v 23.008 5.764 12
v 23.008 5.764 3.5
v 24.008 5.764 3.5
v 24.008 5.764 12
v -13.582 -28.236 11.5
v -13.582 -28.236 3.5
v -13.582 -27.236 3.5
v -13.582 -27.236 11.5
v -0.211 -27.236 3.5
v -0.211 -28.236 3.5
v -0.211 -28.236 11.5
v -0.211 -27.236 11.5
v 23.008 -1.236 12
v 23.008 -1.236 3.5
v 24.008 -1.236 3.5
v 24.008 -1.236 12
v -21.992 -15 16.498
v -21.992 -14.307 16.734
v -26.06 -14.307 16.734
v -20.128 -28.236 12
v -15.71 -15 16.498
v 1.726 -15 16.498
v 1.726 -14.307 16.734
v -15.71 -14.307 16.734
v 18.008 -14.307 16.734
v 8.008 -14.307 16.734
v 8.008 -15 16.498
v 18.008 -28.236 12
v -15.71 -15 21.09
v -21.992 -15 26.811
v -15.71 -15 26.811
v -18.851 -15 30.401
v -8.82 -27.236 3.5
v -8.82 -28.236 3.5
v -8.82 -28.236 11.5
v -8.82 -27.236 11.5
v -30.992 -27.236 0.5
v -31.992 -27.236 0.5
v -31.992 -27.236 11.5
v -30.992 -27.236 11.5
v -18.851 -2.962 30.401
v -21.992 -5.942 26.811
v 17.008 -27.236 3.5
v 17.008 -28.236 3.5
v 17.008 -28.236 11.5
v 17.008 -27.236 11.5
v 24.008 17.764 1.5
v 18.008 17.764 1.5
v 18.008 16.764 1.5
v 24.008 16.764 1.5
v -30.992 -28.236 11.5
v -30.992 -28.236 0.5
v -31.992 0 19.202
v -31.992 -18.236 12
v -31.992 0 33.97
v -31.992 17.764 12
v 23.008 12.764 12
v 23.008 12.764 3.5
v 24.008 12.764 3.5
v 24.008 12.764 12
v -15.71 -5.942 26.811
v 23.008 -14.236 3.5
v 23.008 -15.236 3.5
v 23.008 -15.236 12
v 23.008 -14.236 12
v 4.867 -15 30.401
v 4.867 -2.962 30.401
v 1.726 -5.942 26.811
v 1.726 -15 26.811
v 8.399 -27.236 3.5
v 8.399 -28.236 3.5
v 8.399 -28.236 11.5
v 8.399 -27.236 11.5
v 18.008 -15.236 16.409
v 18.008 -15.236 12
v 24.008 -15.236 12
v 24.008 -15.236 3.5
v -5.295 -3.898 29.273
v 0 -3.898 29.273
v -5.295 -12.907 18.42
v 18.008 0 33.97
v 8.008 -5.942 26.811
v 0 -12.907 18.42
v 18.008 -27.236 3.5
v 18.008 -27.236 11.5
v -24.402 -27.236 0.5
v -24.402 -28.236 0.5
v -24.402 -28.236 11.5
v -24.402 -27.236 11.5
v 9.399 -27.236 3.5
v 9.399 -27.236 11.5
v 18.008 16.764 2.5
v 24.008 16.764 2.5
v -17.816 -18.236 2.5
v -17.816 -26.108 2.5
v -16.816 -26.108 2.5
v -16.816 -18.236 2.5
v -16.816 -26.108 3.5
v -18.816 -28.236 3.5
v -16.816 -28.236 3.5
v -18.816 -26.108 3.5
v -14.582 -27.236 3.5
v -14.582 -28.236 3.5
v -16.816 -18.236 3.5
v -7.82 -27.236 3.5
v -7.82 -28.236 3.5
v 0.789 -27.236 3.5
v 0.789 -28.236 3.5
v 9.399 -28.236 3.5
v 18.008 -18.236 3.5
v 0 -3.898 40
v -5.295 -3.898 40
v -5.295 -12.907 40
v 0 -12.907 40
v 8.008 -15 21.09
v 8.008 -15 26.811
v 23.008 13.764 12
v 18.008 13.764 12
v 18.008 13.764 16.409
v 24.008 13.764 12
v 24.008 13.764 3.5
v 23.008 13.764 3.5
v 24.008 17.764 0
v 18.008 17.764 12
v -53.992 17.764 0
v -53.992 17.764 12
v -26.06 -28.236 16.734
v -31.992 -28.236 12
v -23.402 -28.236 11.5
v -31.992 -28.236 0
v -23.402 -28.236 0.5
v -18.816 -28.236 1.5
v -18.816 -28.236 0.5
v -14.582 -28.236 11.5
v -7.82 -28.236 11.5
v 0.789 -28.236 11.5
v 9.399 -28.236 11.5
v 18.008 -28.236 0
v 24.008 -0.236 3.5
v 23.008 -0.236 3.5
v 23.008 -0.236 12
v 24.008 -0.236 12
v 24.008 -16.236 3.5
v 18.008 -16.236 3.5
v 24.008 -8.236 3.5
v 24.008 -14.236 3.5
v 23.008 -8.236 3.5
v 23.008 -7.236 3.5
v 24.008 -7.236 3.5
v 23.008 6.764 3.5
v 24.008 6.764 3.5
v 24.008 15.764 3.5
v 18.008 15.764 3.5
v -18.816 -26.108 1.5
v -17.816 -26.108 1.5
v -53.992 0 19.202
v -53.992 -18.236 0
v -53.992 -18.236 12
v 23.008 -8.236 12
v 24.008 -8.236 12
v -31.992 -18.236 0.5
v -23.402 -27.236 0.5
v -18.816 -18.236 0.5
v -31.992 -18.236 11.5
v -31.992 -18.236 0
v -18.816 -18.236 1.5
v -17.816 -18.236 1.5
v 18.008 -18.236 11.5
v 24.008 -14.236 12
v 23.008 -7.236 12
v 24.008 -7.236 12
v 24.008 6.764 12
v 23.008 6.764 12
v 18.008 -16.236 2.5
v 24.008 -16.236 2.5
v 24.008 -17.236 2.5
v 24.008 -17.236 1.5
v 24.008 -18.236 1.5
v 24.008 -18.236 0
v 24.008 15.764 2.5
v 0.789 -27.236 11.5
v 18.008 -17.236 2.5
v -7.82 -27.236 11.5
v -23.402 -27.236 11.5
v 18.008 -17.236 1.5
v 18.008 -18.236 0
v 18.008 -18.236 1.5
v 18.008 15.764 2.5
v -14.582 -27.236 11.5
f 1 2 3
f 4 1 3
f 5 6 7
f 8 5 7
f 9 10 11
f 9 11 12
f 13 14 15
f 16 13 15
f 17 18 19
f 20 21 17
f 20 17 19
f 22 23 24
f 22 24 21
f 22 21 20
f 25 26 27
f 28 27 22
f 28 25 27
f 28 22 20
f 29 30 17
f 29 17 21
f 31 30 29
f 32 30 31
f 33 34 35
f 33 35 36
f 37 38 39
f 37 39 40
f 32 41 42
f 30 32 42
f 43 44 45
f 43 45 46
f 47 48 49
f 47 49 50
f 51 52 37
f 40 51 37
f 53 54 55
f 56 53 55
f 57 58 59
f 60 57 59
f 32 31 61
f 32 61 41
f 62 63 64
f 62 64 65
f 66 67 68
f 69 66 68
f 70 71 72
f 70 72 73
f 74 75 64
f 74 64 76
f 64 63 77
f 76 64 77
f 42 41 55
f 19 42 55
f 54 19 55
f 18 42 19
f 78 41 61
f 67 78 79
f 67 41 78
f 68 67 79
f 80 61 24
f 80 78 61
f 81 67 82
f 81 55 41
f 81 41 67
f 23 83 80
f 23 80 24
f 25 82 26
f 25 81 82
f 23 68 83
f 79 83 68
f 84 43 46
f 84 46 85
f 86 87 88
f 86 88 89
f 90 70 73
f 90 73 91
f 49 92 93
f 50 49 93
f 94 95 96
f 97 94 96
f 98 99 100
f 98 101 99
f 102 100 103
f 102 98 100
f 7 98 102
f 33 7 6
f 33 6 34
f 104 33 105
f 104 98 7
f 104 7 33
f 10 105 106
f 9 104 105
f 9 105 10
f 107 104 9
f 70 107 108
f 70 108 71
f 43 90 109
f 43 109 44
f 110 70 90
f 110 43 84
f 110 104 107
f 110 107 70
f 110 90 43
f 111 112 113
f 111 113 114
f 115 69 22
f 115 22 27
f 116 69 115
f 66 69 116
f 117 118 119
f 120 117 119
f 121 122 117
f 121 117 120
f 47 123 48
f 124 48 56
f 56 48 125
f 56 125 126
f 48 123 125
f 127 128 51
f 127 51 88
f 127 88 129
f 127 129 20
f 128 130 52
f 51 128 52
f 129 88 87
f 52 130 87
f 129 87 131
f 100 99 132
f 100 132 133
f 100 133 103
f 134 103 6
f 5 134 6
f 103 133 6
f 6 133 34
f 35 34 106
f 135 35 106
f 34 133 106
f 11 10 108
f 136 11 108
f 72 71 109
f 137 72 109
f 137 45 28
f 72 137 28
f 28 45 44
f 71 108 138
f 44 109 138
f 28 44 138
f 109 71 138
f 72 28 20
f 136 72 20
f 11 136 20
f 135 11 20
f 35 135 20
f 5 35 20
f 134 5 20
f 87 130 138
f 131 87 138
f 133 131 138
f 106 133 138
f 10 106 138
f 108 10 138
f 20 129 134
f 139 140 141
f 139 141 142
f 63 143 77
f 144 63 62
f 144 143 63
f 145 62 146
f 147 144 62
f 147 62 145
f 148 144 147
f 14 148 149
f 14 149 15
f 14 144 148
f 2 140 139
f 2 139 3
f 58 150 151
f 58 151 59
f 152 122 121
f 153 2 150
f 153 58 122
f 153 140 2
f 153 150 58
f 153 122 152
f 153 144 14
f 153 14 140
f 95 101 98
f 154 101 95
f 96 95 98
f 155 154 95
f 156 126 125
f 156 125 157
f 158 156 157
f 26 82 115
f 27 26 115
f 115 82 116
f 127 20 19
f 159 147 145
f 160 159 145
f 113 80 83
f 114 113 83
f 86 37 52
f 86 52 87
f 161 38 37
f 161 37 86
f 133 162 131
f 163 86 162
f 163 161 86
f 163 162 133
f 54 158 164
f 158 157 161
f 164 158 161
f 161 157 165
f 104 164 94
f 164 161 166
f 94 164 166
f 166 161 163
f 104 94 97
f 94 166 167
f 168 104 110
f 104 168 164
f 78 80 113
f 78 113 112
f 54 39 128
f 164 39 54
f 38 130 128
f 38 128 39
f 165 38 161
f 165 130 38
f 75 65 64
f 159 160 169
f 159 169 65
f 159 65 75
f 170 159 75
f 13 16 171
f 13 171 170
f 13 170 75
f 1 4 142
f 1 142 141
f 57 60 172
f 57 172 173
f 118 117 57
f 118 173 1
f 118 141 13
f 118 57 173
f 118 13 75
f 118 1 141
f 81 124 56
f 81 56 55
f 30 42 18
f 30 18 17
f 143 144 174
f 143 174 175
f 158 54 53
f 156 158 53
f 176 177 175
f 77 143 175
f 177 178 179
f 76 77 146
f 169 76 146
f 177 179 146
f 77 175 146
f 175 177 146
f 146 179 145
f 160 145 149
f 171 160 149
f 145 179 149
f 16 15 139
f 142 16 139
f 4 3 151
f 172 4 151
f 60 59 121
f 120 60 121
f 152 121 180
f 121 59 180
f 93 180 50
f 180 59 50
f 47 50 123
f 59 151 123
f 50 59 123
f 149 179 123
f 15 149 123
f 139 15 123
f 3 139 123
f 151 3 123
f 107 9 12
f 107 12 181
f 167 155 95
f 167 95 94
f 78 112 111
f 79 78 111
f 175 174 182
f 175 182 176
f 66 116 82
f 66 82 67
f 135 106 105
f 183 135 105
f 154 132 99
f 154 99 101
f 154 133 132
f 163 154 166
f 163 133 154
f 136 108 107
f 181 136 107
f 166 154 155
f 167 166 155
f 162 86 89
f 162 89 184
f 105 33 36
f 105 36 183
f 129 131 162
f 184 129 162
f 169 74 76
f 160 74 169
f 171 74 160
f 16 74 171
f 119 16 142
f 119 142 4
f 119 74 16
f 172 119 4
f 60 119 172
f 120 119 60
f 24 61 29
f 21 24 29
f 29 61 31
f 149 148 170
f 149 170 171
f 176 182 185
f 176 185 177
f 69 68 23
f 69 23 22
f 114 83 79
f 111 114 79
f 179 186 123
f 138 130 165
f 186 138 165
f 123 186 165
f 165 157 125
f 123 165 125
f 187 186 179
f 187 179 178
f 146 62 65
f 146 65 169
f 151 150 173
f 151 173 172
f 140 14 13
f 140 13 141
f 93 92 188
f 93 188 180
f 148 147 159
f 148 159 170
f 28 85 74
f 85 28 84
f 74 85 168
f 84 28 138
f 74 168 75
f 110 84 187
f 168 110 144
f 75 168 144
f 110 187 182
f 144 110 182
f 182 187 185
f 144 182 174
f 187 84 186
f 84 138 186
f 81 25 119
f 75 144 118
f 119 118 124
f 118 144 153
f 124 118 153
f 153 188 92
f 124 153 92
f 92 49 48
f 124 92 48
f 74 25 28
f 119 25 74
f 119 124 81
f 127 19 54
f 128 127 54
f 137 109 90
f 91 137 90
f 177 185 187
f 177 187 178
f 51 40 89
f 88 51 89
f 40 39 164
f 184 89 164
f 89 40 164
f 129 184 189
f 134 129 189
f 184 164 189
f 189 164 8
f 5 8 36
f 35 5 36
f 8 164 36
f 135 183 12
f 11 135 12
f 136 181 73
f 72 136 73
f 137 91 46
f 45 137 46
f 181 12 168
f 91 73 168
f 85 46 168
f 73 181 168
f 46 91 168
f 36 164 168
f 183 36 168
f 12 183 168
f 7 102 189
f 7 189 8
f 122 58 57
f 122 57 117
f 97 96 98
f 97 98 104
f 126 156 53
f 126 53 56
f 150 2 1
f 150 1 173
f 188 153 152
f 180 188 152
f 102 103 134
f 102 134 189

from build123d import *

# Parameters (mm, degrees)
F0_W       = 72
F0_H       = 36
F1_DEPTH   = 12
F3_DEPTH   = 50
F5_DEPTH   = 22
F6_W       = 50
F6_H       = 0.5
F7_DEPTH   = 10
F8_DEPTH   = 10
F13_W      = 1
F13_H      = 10
F14_DEPTH  = 1
F15_DEPTH  = 2
F13_W_2    = 34.824172408
F16_DEPTH  = 3
F17_W      = 1
F17_H      = 1
F18_DEPTH  = 8
F19_DEPTH  = 8
F20_DEPTH  = 8
F21_DEPTH  = 8
F22_DEPTH  = 8
F13_H_2    = 1
F23_DEPTH  = 11
F24_DEPTH  = 11
F25_W      = 1
F25_H      = 2.1276606619
F27_DEPTH  = 2
F26_W      = 1
F26_H      = 2.1276606619
F28_DEPTH  = 1
F29_W      = 36
F29_H      = 3.5
F30_DEPTH  = 6
F31_W      = 6
F31_H      = 1
F32_DEPTH  = 2
F33_DEPTH  = 1
F34_DEPTH  = 2
F35_DEPTH  = 1
F37_START  = -4
F37_DEPTH  = 29
F38_W      = 1
F38_H      = 1
F39_DEPTH  = 8.5
F40_DEPTH  = 8.5
F41_DEPTH  = 8.5
F42_DEPTH  = 8.5
F43_DEPTH  = 8.5
F45_W      = 6.2820501626
F45_H      = 5.7211536914
F46_FACE_W = 6.2820501626
F46_FACE_H = 4.3090674287
F47_FACE_W = 6.2820501626
F47_FACE_H = 4.3090674287
F51_W      = 5.2950629033
F51_H      = 9.0086418204


with BuildPart() as f1:
    # F0 (on Top) → F1 (new body)
    with BuildSketch(Plane.XY):
        with Locations((-17.9916281849, -0.2358976454)):
            Rectangle(F0_W, F0_H)
    extrude(amount=F1_DEPTH)

    # F2 (on face) → F3 (join)
    with BuildSketch(Plane.YZ.offset(18.0083718151)):
        Polygon((-18.2358976454, 12), (17.7641023546, 12), (0, 33.9695699513), align=None)
    extrude(amount=-F3_DEPTH)

    # F4 (on face) → F5 (join, through all)
    with BuildSketch(Plane(origin=(-53.9916281849, 0, 0), x_dir=(0, -1, 0), z_dir=(-1, 0, 0))):
        Polygon((0, 19.2015562207), (-17.7641023546, 12), (18.2358976454, 12), align=None)
    extrude(amount=-F5_DEPTH)

    # F6 (on face) → F7 (join)
    with BuildSketch(Plane.XZ.offset(18.2358976454)):
        with Locations((-6.9916281849, 11.75)):
            Rectangle(F6_W, F6_H)
    extrude(amount=F7_DEPTH)

    # F6 (on face) → F8 (join)
    with BuildSketch(Plane.XZ.offset(18.2358976454)):
        with Locations((-6.9916281849, 0.25)):
            Rectangle(F6_W, F6_H)
    extrude(amount=F8_DEPTH)

    # F9 (on face) → F10 (join, up to the next surface of F1)
    with BuildSketch(Plane.XZ.offset(28.2358976454)):
        Polygon((-26.0598938912, 16.733692959), (-31.9916281849, 12), (-20.1281595975, 12), align=None)
    extrude(until=Until.NEXT, dir=(0, 1, 0))

    # F11 (on face) → F12 (join, up to the next surface of F1)
    with BuildSketch(Plane.YZ.offset(18.0083718151)):
        Polygon((-14.3066837157, 16.733692959), (-28.2358976454, 12), (-18.2358976454, 12), align=None)
    extrude(until=Until.NEXT, dir=(-1, 0, 0))

    # F13 (on face) → F14 (join)
    with BuildSketch(Plane.XY.offset(0.5)):
        with Locations((-18.3158005929, -23.2358976454)):
            Rectangle(F13_W, F13_H)
    extrude(amount=F14_DEPTH)

    # F13 (on face) → F15 (join)
    with BuildSketch(Plane.XY.offset(0.5)):
        with Locations((-17.3158005929, -23.2358976454)):
            Rectangle(F13_W, F13_H)
    extrude(amount=F15_DEPTH)

    # F13 (on face) → F16 (join)
    with BuildSketch(Plane.XY.offset(0.5)):
        with Locations((0.5962856111, -23.2358976454)):
            Rectangle(F13_W_2, F13_H)
    extrude(amount=F16_DEPTH)

    # F17 (on face) → F18 (join, through all)
    with BuildSketch(Plane.XY.offset(3.5)):
        with Locations((-14.0816532895, -27.7358976454)):
            Rectangle(F17_W, F17_H)
    extrude(amount=F18_DEPTH)

    # F17 (on face) → F19 (join, through all)
    with BuildSketch(Plane.XY.offset(3.5)):
        with Locations((-8.3204968274, -27.7358976454)):
            Rectangle(F17_W, F17_H)
    extrude(amount=F19_DEPTH)

    # F17 (on face) → F20 (join, through all)
    with BuildSketch(Plane.XY.offset(3.5)):
        with Locations((0.2891260535, -27.7358976454)):
            Rectangle(F17_W, F17_H)
    extrude(amount=F20_DEPTH)

    # F17 (on face) → F21 (join, through all)
    with BuildSketch(Plane.XY.offset(3.5)):
        with Locations((8.8987489343, -27.7358976454)):
            Rectangle(F17_W, F17_H)
    extrude(amount=F21_DEPTH)

    # F17 (on face) → F22 (join, through all)
    with BuildSketch(Plane.XY.offset(3.5)):
        with Locations((17.5083718151, -27.7358976454)):
            Rectangle(F17_W, F17_H)
    extrude(amount=F22_DEPTH)

    # F13 (on face) → F23 (join, through all)
    with BuildSketch(Plane.XY.offset(0.5)):
        with Locations((-31.4916281849, -27.7358976454)):
            Rectangle(F13_W, F13_H_2)
    extrude(amount=F23_DEPTH)

    # F13 (on face) → F24 (join, through all)
    with BuildSketch(Plane.XY.offset(0.5)):
        with Locations((-23.9017895311, -27.7358976454)):
            Rectangle(F13_W, F13_H_2)
    extrude(amount=F24_DEPTH)

    # F25 (on face) → F27 (join)
    with BuildSketch(Plane.XY.offset(1.5)):
        with Locations((-18.3158005929, -27.1720673144)):
            Rectangle(F25_W, F25_H)
    extrude(amount=F27_DEPTH)

    # F26 (on face) → F28 (join)
    with BuildSketch(Plane.XY.offset(2.5)):
        with Locations((-17.3158005929, -27.1720673144)):
            Rectangle(F26_W, F26_H)
    extrude(amount=F28_DEPTH)

    # F29 (on face) → F30 (join)
    with BuildSketch(Plane.YZ.offset(18.0083718151)):
        with Locations((-0.2358976454, 1.75)):
            Rectangle(F29_W, F29_H)
    extrude(amount=F30_DEPTH)

    # F31 (on face) → F32 (cut)
    with BuildSketch(Plane.XY.offset(3.5)):
        with Locations((21.0083718151, -17.7358976454)):
            Rectangle(F31_W, F31_H)
    extrude(amount=-F32_DEPTH, mode=Mode.SUBTRACT)

    # F31 (on face) → F33 (cut)
    with BuildSketch(Plane.XY.offset(3.5)):
        with Locations((21.0083718151, -16.7358976454)):
            Rectangle(F31_W, F31_H)
    extrude(amount=-F33_DEPTH, mode=Mode.SUBTRACT)

    # F31 (on face) → F34 (cut)
    with BuildSketch(Plane.XY.offset(3.5)):
        with Locations((21.0083718151, 17.2641023546)):
            Rectangle(F31_W, F31_H)
    extrude(amount=-F34_DEPTH, mode=Mode.SUBTRACT)

    # F31 (on face) → F35 (cut)
    with BuildSketch(Plane.XY.offset(3.5)):
        with Locations((21.0083718151, 16.2641023546)):
            Rectangle(F31_W, F31_H)
    extrude(amount=-F35_DEPTH, mode=Mode.SUBTRACT)

    # F36 (on face) → F37 (join)
    with BuildSketch(Plane(origin=(0, 17.7641023546, 0), x_dir=(-1, 0, 0), z_dir=(0, 1, 0)).offset(F37_START)):
        Polygon((-18.0083718151, 12), (-18.0083718151, 16.4085291326), (-24.0083718151, 12), align=None)
    extrude(amount=-F37_DEPTH)

    # F38 (on face) → F39 (join, through all)
    with BuildSketch(Plane.XY.offset(3.5)):
        with Locations((23.5083718151, -14.7358976454)):
            Rectangle(F38_W, F38_H)
    extrude(amount=F39_DEPTH)

    # F38 (on face) → F40 (join, through all)
    with BuildSketch(Plane.XY.offset(3.5)):
        with Locations((23.5083718151, -7.7358976454)):
            Rectangle(F38_W, F38_H)
    extrude(amount=F40_DEPTH)

    # F38 (on face) → F41 (join, through all)
    with BuildSketch(Plane.XY.offset(3.5)):
        with Locations((23.5083718151, -0.7358976454)):
            Rectangle(F38_W, F38_H)
    extrude(amount=F41_DEPTH)

    # F38 (on face) → F42 (join, through all)
    with BuildSketch(Plane.XY.offset(3.5)):
        with Locations((23.5083718151, 6.2641023546)):
            Rectangle(F38_W, F38_H)
    extrude(amount=F42_DEPTH)

    # F38 (on face) → F43 (join, through all)
    with BuildSketch(Plane.XY.offset(3.5)):
        with Locations((23.5083718151, 13.2641023546)):
            Rectangle(F38_W, F38_H)
    extrude(amount=F43_DEPTH)

    # F45 (on offset) → F46 (join, up to the next surface of F1)
    with BuildSketch(Plane.XZ.offset(15)):
        with Locations((-18.8506031036, 23.9503206685)):
            Rectangle(F45_W, F45_H)
        Polygon((-18.8506031036, 30.4006431252), (-21.9916281849, 26.8108975142), (-15.7095780224, 26.8108975142), align=None)
    extrude(until=Until.NEXT, dir=(0, 1, 0))

    # F45 (on offset) → F47 (join, up to the next surface of F1)
    with BuildSketch(Plane.XZ.offset(15)):
        with Locations((4.8673467338, 23.9503206685)):
            Rectangle(F45_W, F45_H)
        Polygon((4.8673467338, 30.4006431252), (1.7263216525, 26.8108975142), (8.0083718151, 26.8108975142), align=None)
    extrude(until=Until.NEXT, dir=(0, 1, 0))

    # F46_face (on face) → F48 (join, up to the next surface of F1)
    with BuildSketch(Plane(origin=(-18.8506031036, -12.8454662856, 21.0897438228), x_dir=(1, 0, 0), z_dir=(0, 0, -1))):
        Rectangle(F46_FACE_W, F46_FACE_H)
    extrude(until=Until.NEXT)

    # F47_face (on face) → F49 (join, up to the next surface of F1)
    with BuildSketch(Plane(origin=(4.8673467338, -12.8454662856, 21.0897438228), x_dir=(1, 0, 0), z_dir=(0, 0, -1))):
        Rectangle(F47_FACE_W, F47_FACE_H)
    extrude(until=Until.NEXT)

    # F51 (on offset) → F52 (join, up to the next surface of F1)
    with BuildSketch(Plane.XY.offset(40)):
        with Locations((-2.6475314517, -8.4023226518)):
            Rectangle(F51_W, F51_H)
    extrude(until=Until.NEXT, dir=(0, 0, -1))


solid = f1.part
